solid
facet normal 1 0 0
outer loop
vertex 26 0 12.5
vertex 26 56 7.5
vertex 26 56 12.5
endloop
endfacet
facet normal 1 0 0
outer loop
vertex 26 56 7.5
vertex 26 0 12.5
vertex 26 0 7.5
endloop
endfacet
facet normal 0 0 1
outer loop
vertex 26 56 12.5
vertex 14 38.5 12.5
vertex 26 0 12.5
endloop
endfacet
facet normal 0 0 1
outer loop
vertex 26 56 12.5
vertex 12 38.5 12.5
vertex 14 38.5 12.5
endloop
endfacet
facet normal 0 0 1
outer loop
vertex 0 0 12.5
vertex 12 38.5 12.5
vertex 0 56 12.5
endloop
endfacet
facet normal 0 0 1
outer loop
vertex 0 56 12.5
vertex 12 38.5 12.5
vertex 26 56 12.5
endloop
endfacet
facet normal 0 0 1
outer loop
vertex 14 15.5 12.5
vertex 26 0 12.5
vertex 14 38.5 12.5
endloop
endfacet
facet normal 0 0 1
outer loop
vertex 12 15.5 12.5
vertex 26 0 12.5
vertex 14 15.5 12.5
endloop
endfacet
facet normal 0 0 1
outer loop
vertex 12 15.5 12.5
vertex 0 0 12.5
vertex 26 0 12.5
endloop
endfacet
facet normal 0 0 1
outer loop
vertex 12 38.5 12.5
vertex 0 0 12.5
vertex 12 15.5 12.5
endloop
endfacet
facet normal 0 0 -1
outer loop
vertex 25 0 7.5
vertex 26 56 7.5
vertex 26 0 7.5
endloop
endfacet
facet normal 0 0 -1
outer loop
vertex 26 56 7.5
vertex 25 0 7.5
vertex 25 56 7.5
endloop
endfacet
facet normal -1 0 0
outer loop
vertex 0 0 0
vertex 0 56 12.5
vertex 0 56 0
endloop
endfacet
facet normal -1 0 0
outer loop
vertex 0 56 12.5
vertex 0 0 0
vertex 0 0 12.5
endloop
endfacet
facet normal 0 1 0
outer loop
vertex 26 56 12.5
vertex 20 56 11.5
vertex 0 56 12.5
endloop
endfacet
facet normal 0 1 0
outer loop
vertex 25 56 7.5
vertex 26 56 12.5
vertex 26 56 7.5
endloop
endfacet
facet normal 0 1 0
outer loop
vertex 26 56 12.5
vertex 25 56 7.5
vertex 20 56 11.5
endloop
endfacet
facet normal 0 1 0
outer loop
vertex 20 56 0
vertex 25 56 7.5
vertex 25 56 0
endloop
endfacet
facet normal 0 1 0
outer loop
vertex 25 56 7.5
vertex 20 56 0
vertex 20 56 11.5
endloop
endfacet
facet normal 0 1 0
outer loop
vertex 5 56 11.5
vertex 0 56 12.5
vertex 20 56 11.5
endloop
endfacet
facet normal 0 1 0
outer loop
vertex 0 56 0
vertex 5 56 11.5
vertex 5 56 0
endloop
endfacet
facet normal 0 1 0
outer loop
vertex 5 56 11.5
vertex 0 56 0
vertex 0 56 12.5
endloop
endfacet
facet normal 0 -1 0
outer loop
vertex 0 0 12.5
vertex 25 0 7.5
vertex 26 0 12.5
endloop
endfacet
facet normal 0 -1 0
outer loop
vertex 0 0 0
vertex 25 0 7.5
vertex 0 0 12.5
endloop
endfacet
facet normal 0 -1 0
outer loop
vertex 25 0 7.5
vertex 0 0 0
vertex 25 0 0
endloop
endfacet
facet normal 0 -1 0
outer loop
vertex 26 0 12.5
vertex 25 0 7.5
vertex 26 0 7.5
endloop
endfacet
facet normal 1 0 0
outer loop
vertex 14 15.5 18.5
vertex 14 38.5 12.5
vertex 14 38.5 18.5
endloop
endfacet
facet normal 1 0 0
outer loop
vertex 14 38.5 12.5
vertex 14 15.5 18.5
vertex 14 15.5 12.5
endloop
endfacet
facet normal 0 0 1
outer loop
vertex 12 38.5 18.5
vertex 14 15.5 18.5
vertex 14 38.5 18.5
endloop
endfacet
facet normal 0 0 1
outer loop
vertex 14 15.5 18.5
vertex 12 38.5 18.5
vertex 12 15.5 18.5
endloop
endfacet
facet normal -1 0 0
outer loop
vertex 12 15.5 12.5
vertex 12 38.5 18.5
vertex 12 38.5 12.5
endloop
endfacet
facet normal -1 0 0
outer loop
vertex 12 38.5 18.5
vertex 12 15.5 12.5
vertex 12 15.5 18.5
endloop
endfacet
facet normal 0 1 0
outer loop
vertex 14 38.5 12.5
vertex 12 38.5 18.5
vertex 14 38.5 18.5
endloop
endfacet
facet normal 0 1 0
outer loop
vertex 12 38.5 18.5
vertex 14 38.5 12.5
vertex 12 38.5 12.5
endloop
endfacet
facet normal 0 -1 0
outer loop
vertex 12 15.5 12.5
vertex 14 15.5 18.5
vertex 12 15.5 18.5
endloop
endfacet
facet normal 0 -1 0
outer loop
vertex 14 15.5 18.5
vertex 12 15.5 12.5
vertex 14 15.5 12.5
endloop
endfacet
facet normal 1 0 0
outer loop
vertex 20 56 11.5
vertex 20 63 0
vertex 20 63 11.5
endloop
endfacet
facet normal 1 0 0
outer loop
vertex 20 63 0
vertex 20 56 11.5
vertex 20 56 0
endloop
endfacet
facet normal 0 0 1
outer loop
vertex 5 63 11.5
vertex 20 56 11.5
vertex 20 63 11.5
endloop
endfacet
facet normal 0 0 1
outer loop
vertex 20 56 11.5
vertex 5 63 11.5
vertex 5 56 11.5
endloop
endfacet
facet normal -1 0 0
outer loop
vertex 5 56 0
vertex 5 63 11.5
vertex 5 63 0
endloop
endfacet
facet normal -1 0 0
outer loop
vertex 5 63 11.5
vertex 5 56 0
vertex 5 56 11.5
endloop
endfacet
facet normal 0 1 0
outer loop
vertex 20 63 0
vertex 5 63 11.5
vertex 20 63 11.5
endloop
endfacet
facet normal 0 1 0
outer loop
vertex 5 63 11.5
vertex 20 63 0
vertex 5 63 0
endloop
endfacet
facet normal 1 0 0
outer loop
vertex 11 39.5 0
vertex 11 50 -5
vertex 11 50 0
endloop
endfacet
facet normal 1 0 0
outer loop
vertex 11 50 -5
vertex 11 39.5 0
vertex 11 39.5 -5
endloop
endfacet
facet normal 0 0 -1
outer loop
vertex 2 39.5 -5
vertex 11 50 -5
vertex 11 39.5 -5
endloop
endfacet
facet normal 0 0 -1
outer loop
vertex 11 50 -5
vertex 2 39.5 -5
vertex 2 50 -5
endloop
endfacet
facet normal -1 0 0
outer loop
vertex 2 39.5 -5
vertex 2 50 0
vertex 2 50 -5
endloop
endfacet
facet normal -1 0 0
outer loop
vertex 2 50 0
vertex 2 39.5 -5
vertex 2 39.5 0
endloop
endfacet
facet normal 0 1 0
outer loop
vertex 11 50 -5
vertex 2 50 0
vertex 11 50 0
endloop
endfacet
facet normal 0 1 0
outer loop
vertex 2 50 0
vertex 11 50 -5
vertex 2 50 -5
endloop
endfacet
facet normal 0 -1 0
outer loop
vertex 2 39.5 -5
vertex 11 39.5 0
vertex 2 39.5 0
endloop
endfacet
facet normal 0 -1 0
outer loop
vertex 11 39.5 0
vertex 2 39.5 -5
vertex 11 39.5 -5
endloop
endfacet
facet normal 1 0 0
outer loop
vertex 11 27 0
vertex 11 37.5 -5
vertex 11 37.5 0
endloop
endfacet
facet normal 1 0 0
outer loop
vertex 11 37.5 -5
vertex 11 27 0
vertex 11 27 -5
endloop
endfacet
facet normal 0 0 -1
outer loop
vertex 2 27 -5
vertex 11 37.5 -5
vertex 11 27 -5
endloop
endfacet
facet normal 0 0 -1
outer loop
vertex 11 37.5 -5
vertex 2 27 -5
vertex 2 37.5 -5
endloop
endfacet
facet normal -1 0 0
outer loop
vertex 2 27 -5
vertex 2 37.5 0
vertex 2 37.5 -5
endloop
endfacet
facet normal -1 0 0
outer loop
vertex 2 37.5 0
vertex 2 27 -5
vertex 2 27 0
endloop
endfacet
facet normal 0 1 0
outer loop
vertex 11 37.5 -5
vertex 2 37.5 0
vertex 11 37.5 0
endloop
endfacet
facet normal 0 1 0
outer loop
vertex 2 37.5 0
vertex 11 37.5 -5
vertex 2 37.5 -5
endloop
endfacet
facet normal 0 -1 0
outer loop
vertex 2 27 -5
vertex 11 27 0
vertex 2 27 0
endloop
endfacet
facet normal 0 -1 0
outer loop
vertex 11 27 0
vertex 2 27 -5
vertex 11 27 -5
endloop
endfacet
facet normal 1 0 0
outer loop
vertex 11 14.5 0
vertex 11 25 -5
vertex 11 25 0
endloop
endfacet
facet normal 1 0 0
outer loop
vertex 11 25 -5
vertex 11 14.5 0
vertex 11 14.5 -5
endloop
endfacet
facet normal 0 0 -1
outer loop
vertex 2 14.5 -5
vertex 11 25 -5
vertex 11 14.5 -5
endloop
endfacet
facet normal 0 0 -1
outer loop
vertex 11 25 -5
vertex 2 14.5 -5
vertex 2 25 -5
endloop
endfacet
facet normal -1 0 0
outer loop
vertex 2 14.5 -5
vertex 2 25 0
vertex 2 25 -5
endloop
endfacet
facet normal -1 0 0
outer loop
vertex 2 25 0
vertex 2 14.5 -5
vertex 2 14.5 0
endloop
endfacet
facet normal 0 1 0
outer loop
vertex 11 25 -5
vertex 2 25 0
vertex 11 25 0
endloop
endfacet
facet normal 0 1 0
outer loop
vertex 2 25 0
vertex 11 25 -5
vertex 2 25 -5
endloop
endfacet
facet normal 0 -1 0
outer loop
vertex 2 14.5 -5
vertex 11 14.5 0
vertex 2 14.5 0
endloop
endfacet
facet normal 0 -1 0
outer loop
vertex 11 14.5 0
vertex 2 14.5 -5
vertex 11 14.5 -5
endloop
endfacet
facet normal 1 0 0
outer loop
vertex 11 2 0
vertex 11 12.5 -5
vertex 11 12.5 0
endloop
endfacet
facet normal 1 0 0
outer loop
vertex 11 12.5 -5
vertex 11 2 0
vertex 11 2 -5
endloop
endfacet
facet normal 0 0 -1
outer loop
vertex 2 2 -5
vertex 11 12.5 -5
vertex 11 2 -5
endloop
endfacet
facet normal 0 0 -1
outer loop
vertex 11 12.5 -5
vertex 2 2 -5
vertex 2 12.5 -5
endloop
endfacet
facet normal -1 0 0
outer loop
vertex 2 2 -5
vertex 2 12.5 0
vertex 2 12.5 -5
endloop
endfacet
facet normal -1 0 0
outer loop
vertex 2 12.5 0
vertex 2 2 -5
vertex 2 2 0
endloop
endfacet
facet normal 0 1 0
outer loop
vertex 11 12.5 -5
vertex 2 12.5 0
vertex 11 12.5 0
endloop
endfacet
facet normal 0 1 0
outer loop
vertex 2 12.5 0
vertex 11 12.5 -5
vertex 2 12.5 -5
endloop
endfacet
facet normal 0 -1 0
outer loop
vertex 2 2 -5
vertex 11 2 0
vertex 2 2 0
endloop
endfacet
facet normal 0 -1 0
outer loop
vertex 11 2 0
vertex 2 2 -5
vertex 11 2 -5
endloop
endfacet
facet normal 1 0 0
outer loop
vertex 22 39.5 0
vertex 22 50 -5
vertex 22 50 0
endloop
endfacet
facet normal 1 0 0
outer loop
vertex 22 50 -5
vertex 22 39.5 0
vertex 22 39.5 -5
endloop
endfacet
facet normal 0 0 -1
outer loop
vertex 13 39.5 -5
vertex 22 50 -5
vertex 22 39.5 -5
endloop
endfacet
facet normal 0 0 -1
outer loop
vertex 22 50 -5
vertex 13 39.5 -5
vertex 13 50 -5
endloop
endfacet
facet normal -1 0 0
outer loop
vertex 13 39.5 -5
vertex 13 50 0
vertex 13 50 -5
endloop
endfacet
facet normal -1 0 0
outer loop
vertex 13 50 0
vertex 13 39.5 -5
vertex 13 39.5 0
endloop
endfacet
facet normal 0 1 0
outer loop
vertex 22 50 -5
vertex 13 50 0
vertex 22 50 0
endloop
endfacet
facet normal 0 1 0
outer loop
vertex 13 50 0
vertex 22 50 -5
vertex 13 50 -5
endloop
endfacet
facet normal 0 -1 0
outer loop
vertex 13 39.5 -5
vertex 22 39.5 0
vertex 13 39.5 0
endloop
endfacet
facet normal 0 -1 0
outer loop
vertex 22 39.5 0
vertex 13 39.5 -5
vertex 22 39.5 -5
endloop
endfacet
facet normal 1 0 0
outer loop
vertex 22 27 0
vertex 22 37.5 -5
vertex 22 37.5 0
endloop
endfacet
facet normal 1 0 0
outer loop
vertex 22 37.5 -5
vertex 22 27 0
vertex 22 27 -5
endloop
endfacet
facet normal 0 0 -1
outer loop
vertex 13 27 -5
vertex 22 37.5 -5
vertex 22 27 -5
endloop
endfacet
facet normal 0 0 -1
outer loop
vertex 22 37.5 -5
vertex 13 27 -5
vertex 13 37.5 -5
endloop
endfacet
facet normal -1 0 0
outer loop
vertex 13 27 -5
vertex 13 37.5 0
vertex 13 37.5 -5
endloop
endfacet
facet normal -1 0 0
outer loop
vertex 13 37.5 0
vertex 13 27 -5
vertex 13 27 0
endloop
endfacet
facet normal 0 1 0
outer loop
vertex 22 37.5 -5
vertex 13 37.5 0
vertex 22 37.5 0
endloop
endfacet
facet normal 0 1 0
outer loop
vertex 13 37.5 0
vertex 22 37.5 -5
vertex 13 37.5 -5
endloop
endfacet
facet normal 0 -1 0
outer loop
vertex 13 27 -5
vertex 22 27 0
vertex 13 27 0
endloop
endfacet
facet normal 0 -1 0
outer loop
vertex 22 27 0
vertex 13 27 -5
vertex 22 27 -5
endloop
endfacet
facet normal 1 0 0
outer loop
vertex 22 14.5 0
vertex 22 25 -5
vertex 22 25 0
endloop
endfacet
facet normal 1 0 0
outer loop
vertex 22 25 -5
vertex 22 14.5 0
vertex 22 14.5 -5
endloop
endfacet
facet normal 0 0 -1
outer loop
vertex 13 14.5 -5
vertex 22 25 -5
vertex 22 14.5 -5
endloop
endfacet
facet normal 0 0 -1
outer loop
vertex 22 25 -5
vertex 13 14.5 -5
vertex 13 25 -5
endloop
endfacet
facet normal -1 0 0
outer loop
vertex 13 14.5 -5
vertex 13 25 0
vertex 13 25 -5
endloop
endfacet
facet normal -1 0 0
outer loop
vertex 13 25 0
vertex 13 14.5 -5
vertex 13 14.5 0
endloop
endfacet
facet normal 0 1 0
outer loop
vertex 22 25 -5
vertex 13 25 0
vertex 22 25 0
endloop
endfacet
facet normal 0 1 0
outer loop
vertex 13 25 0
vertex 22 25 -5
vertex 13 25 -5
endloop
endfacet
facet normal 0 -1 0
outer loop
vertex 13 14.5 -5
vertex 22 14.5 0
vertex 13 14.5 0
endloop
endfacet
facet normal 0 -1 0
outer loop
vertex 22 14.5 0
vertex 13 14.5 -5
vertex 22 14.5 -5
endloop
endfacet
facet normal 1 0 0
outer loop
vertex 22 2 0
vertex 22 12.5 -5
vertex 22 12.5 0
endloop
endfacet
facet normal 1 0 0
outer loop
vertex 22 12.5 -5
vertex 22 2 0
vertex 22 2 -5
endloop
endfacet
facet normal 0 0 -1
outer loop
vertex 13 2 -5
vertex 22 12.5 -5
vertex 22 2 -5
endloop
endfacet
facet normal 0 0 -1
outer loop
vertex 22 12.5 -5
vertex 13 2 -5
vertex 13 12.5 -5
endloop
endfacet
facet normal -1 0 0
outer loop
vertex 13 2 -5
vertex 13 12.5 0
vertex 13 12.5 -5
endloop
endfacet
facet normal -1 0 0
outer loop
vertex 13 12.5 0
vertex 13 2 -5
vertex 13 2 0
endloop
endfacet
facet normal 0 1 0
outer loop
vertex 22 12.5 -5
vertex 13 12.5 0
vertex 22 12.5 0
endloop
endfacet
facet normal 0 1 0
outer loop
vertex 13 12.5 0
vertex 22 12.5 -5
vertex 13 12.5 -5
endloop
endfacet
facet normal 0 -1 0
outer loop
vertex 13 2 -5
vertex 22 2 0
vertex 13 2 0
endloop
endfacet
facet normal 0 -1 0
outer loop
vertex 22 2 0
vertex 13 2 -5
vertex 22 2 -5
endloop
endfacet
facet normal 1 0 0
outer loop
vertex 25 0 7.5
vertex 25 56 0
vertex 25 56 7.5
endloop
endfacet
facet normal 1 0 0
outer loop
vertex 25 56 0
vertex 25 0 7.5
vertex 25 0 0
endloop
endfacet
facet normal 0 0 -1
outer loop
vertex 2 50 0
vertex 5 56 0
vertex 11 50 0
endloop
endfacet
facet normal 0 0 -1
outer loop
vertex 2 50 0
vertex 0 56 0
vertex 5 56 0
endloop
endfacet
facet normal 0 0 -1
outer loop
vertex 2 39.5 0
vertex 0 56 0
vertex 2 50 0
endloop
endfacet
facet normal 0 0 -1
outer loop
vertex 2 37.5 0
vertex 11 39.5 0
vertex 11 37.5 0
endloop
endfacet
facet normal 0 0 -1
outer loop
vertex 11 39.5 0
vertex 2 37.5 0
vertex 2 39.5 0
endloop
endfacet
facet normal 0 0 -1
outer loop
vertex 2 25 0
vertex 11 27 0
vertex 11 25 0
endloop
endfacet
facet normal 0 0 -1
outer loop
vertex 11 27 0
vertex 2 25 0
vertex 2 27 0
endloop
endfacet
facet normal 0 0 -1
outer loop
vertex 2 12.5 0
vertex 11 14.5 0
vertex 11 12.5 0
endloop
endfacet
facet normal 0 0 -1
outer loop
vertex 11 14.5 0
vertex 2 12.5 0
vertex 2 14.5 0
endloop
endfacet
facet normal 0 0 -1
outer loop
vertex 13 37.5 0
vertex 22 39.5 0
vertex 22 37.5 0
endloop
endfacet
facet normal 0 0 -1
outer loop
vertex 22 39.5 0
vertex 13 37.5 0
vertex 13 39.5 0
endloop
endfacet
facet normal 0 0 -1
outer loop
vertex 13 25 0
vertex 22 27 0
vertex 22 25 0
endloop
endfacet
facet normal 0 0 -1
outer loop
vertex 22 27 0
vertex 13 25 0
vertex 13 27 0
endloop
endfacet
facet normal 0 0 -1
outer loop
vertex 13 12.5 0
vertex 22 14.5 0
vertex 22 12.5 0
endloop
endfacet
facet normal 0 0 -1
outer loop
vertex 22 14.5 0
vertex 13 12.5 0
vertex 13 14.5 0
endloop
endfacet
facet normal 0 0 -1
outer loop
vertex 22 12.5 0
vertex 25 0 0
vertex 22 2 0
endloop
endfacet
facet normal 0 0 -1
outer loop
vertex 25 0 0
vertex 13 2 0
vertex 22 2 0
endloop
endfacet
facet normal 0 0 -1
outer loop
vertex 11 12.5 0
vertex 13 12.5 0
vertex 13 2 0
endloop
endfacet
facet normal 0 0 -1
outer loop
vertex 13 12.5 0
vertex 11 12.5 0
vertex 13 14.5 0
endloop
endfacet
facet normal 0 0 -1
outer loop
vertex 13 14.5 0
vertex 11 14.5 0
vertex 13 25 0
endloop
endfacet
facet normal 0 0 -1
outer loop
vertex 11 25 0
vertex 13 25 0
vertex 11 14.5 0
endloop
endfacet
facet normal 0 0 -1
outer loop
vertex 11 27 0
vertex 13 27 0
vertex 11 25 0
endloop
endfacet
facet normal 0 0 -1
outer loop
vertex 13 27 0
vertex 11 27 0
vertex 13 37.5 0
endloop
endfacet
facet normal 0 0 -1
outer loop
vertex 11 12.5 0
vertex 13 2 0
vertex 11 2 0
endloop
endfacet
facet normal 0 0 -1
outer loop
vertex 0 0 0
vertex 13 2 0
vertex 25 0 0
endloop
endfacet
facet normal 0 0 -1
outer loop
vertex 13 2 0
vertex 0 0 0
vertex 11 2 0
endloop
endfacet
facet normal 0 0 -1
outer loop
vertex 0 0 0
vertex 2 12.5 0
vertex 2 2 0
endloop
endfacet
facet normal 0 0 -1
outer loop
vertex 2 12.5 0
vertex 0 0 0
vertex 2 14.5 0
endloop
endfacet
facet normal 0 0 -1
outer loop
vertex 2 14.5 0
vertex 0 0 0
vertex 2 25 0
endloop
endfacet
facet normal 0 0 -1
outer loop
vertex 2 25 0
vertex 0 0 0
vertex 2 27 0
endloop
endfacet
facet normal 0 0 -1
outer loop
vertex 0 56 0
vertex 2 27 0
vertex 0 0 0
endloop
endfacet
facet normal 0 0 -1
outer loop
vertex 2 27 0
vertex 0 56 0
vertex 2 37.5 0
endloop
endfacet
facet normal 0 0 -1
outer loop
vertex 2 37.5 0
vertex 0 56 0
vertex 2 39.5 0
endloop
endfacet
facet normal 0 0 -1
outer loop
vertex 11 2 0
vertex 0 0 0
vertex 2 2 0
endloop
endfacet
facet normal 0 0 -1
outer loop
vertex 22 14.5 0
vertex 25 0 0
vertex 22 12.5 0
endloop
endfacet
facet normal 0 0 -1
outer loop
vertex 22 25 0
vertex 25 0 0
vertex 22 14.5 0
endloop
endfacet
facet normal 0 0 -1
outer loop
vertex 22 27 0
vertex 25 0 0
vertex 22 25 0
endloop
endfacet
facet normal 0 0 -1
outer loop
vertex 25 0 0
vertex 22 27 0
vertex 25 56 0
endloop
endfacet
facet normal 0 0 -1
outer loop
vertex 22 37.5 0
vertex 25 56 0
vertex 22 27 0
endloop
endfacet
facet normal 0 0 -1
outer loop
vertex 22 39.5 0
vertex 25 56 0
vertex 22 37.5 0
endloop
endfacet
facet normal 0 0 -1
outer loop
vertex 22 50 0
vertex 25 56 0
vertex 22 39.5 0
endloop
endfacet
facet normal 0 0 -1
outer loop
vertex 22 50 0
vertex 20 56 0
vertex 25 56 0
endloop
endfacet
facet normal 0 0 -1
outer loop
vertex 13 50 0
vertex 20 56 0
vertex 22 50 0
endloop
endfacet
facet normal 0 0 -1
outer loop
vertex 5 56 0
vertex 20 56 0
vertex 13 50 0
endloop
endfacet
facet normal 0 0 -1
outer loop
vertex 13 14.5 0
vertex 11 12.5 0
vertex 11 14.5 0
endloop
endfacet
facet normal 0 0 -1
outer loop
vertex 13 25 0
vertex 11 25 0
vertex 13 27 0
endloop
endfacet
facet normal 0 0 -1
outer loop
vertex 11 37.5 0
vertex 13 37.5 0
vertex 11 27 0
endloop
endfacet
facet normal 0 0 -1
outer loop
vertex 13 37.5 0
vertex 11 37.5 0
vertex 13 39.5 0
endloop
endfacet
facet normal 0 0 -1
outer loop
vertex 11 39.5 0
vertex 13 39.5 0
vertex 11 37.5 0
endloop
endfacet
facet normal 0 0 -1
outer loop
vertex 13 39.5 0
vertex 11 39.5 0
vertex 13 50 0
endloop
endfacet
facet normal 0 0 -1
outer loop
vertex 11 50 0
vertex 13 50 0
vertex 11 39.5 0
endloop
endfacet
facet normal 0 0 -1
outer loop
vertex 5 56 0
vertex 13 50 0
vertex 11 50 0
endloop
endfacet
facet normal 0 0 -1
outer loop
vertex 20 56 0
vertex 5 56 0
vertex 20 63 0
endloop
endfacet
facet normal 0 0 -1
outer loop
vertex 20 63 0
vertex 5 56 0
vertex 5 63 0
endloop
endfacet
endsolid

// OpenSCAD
    union() {
        // main well for LabTek - should match chamber size + tolerance
        color("red",1 ) cube([25,56,12]);
        // annoying tab
        color("red",1 ) translate([5,56,0]) cube([15,7,8]);   
        
        //lid
        translate([0,0,7.5]) union() {
            color("orange",1 ) cube([26,56,5]);
            color("orange",1 ) translate([12,15.5,5]) cube([2,23,6]);
            color("orange",1 ) translate([5,56,0]) cube([15,7,4]);  
        }
        
         
        
        // viewing hole lattice
        translate([2,2,-5]) {
            translate([0,37.5,0]) cube([9,10.5,10]);
            translate([0,25,0]) cube([9,10.5,10]);
            translate([0,12.5,0]) cube([9,10.5,10]);
            translate([0,0,0]) cube([9,10.5,10]);
            
            translate([11,37.5,0]) cube([9,10.5,10]);
            translate([11,25,0]) cube([9,10.5,10]);
            translate([11,12.5,0]) cube([9,10.5,10]);
            translate([11,0,0]) cube([9,10.5,10]);
        }
    }
    
    
    
    
           
        
        
        
        

        
